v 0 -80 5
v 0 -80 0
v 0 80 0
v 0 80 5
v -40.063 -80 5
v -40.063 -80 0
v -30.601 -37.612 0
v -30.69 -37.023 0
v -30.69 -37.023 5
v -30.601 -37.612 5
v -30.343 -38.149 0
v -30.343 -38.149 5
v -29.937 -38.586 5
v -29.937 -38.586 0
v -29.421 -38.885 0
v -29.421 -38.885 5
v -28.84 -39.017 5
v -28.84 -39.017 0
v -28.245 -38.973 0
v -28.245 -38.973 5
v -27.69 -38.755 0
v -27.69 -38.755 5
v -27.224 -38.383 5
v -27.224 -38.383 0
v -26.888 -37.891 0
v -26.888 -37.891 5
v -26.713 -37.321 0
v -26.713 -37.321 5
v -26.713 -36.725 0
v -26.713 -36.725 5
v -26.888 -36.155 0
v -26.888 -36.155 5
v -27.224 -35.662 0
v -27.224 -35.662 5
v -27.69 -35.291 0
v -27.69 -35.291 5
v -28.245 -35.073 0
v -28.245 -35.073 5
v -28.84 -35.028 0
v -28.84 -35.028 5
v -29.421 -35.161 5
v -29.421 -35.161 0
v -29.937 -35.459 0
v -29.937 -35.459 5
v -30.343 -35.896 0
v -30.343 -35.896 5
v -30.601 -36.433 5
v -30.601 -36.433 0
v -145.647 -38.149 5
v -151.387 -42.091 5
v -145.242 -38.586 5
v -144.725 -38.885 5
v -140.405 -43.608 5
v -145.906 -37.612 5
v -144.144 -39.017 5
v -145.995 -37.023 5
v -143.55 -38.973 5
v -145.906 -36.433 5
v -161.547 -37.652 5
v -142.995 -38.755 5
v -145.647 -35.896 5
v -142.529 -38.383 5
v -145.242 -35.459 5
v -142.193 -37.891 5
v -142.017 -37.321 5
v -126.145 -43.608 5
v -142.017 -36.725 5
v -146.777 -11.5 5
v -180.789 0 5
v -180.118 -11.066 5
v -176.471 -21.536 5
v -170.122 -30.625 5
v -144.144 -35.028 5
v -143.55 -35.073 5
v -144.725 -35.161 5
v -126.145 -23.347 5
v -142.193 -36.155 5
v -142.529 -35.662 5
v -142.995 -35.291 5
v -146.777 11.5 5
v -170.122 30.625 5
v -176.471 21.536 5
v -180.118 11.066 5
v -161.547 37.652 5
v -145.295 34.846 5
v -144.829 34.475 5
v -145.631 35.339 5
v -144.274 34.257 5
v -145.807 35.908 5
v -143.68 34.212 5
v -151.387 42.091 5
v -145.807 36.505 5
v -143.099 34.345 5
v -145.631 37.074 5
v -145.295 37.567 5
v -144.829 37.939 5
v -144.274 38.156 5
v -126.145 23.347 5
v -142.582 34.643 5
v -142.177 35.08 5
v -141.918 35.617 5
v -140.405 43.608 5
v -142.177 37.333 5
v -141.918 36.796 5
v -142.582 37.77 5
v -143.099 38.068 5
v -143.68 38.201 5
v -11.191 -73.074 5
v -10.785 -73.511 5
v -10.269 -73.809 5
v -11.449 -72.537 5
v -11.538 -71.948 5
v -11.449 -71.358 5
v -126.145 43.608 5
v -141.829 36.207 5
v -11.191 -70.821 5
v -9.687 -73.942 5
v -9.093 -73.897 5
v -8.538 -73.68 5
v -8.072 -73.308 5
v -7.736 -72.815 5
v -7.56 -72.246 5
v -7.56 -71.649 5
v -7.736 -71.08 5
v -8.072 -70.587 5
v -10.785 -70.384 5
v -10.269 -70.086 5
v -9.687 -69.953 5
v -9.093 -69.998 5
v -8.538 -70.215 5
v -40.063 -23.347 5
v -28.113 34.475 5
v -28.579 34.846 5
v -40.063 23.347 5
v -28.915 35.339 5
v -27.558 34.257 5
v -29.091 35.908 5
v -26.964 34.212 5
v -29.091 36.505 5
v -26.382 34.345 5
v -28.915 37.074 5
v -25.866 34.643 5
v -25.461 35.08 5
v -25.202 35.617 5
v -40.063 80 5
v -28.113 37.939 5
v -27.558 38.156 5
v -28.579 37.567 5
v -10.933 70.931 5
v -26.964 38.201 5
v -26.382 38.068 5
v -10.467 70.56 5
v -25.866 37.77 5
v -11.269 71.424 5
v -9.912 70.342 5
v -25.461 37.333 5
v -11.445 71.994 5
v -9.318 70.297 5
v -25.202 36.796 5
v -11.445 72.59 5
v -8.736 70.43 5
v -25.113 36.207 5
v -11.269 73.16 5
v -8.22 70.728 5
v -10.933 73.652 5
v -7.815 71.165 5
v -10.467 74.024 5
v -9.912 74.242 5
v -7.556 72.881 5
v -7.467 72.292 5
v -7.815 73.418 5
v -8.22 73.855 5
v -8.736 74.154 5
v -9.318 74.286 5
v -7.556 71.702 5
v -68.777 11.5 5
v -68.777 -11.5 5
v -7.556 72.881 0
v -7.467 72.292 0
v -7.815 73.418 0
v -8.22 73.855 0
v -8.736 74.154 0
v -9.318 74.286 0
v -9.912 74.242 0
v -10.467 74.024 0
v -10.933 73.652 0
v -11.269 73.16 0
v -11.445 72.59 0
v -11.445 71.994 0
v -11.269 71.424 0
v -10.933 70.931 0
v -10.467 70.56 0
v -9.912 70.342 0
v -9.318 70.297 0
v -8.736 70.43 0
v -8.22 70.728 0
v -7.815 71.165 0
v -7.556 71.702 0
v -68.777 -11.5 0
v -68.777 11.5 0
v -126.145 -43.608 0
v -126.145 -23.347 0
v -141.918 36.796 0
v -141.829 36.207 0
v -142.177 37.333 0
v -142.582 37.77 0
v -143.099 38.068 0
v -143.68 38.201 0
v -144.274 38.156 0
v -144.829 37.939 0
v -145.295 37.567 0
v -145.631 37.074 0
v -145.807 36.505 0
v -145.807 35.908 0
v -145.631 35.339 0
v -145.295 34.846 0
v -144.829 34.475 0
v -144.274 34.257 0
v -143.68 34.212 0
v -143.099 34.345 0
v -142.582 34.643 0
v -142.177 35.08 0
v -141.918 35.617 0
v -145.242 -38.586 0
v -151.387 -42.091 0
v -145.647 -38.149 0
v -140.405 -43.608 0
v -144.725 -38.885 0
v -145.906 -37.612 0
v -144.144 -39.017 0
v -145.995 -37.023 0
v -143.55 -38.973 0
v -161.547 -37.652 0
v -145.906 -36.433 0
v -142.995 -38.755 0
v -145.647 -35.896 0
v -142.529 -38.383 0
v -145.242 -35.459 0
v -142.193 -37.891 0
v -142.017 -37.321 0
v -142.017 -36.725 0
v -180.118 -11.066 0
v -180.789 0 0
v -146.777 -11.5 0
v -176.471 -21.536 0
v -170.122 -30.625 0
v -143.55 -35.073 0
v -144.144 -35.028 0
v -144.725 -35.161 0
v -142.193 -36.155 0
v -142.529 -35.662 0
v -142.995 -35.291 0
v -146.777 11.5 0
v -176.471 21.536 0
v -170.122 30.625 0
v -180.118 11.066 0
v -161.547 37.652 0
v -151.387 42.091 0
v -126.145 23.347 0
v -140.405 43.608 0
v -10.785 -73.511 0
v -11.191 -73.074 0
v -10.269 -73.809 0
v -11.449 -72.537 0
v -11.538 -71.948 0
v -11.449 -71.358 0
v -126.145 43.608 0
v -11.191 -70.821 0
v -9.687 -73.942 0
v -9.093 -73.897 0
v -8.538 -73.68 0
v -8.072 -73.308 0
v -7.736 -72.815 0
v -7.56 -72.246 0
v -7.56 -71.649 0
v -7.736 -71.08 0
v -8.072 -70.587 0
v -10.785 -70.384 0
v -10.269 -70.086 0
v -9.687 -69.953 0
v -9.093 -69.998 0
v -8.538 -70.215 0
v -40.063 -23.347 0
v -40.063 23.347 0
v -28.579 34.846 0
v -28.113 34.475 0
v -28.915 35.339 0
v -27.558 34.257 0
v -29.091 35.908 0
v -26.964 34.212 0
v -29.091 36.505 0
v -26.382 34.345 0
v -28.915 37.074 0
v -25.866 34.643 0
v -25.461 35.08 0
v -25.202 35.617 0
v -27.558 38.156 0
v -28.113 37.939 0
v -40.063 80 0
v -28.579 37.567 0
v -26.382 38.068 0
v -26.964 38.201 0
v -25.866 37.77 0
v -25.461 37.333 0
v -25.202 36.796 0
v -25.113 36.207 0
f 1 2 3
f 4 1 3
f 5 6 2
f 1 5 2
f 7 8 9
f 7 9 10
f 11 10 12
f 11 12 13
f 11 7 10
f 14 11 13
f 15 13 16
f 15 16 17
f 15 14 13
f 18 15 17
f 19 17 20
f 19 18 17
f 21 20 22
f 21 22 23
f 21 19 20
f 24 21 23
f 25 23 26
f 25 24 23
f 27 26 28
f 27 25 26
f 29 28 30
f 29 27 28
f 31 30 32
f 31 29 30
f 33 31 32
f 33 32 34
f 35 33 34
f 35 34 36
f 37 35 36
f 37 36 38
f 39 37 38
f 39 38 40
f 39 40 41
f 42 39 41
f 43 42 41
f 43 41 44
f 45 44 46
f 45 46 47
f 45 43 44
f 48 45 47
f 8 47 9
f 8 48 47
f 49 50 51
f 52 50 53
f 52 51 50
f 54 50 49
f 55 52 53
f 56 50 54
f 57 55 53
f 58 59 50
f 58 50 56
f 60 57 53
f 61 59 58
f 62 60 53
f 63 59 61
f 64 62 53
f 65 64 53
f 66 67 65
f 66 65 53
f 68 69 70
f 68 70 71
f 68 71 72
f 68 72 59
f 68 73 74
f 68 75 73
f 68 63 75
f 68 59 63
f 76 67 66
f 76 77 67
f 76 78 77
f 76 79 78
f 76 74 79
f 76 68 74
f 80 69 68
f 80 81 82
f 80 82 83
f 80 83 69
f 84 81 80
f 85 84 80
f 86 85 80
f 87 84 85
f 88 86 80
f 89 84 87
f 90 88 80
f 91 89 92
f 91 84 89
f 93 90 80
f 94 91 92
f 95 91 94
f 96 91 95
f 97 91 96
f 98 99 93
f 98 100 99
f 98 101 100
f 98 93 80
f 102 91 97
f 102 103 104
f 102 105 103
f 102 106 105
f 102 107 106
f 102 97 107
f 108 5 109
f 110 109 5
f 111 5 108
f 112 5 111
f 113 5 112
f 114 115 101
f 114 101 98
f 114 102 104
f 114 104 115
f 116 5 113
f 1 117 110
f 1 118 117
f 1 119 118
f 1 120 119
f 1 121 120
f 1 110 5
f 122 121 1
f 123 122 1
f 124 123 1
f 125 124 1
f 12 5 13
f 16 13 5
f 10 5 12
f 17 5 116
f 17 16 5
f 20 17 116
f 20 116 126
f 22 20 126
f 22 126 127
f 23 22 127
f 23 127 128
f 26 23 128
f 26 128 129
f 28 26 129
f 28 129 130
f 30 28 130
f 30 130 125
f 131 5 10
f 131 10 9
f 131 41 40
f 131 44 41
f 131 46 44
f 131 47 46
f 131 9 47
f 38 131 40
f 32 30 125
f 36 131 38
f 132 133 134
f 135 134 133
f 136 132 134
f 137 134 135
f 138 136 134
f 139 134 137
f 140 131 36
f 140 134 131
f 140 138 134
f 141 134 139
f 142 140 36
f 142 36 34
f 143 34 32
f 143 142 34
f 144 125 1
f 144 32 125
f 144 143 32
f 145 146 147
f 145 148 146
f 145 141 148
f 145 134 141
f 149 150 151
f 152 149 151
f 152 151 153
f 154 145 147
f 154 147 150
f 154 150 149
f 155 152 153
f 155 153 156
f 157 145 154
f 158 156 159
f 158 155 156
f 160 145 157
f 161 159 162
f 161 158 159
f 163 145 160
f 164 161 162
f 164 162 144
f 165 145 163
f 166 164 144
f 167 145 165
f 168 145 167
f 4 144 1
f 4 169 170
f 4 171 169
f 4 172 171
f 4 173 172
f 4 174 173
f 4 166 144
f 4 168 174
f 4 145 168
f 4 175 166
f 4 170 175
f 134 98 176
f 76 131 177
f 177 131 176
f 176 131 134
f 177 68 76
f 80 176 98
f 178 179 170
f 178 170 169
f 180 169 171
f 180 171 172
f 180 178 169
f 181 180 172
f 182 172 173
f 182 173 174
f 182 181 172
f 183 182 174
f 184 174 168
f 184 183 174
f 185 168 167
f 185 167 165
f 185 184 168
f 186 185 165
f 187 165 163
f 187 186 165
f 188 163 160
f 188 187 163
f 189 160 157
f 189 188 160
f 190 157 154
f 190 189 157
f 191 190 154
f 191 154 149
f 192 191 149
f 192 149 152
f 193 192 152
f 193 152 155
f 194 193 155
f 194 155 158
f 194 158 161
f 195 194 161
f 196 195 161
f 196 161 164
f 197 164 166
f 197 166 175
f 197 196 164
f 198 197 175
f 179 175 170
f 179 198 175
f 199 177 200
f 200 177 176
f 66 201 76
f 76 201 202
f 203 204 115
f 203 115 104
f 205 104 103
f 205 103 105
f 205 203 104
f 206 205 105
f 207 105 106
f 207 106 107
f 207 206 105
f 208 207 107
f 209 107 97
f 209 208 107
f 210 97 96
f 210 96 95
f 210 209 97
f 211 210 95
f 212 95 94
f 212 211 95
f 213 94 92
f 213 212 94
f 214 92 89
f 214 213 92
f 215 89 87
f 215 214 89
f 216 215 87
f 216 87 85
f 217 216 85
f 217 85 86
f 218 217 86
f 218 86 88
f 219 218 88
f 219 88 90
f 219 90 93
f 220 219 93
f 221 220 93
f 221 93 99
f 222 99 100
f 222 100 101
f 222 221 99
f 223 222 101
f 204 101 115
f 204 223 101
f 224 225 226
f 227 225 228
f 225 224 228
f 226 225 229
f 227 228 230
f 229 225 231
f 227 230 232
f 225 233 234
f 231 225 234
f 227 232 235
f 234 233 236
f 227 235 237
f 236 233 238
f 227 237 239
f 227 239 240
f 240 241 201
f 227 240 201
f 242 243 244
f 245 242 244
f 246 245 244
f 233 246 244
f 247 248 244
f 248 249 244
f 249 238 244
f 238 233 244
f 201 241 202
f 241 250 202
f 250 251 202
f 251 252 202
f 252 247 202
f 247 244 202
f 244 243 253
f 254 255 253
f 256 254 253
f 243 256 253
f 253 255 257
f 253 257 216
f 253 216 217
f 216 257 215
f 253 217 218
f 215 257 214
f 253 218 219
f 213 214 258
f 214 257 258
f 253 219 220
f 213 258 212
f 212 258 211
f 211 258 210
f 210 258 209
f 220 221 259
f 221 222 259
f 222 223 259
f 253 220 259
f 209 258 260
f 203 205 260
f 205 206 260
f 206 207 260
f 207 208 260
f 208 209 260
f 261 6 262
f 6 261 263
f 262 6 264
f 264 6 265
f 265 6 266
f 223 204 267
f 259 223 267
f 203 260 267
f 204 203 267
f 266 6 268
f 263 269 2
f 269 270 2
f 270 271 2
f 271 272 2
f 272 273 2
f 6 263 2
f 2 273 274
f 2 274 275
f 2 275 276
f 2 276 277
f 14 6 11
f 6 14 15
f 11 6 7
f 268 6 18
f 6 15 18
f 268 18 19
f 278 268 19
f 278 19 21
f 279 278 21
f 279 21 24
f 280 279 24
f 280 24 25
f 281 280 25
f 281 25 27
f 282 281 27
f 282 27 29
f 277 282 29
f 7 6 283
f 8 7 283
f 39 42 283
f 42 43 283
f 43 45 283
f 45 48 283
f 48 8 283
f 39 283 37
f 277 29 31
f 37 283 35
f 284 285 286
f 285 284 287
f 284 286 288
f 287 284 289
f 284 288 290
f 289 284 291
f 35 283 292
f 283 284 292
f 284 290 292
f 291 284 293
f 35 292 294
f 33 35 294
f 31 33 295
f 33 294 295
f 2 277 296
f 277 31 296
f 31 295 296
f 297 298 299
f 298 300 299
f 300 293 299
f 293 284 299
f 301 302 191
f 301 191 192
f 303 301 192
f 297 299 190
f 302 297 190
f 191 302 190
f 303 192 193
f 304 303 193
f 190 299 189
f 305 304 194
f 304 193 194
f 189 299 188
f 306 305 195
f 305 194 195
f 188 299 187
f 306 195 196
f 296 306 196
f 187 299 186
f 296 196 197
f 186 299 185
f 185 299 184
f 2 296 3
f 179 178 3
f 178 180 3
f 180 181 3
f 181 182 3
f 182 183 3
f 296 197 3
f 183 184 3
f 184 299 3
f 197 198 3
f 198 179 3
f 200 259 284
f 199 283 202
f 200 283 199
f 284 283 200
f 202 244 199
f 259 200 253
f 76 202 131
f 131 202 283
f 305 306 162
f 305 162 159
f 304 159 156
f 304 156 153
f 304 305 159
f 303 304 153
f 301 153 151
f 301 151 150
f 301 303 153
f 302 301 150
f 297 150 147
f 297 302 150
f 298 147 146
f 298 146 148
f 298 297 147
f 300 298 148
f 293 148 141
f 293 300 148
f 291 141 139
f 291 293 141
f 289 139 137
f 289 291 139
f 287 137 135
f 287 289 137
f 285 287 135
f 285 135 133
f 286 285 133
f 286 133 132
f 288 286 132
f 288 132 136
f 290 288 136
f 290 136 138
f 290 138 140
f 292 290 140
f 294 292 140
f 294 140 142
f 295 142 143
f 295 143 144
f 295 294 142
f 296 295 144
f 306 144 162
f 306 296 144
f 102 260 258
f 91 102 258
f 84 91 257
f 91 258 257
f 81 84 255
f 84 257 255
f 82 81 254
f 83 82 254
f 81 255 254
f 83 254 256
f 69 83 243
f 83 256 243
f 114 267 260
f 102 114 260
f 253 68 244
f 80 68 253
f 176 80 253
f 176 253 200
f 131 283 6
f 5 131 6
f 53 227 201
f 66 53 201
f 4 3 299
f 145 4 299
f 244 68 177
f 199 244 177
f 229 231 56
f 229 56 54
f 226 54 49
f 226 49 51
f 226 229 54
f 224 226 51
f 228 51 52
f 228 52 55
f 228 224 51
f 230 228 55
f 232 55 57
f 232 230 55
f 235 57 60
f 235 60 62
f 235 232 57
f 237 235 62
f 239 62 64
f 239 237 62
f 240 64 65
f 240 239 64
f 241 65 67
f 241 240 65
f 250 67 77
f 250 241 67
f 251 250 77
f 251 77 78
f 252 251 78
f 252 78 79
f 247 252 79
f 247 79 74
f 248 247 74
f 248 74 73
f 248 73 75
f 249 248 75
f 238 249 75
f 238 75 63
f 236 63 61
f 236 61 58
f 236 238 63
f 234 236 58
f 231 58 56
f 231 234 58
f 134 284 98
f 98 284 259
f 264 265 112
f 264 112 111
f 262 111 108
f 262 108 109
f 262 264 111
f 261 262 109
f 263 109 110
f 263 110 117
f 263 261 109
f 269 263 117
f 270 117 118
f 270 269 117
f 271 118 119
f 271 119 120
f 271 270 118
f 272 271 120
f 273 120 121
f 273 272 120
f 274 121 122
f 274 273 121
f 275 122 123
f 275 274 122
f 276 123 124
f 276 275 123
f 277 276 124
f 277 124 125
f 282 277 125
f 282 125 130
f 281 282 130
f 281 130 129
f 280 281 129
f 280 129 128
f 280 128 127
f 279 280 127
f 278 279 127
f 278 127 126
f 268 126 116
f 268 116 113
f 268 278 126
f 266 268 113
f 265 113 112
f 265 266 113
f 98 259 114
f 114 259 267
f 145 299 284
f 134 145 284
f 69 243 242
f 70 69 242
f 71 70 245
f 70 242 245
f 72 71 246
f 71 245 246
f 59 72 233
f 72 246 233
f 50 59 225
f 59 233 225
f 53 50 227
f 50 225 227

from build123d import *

# Parameters (mm, degrees)
ESQUISSE1_R             = 2
BOSS_EXTRU_2_DEPTH      = 5
ESQUISSE2_W             = 78
ESQUISSE2_H             = 23
ENL_V_MAT_EXTRU_2_DEPTH = 5


with BuildPart() as part:
    # Esquisse1 → Boss.-Extru.2 (new body)
    with BuildSketch(Plane.XY):
        with BuildLine():
            Line((0, 80), (-40.063357395, 80))
            Line((-40.063357395, 80), (-40.063357395, 43.608028339))
            Line((-40.063357395, 43.608028339), (-40.063357395, 23.347203835))
            Line((-40.063357395, 23.347203835), (-126.14466041, 23.347203835))
            Line((-126.14466041, 23.347203835), (-126.14466041, 43.608028339))
            Line((-126.14466041, 43.608028339), (-140.404811956, 43.608028339))
            ThreePointArc((-140.404811956, 43.608028339), (-170.122450923, 30.625328971), (-180.789117416, 0))
            ThreePointArc((-180.789117416, 0), (-170.122450923, -30.625328971), (-140.404811956, -43.608028339))
            Line((-140.404811956, -43.608028339), (-126.14466041, -43.608028339))
            Line((-126.14466041, -43.608028339), (-126.14466041, -23.347203835))
            Line((-126.14466041, -23.347203835), (-40.063357395, -23.347203835))
            Line((-40.063357395, -23.347203835), (-40.063357395, -43.608028339))
            Line((-40.063357395, -43.608028339), (-40.063357395, -80))
            Line((-40.063357395, -80), (0, -80))
            Line((0, -80), (0, 80))
        make_face()
        with Locations((-143.829395777, 36.206579824)):
            Circle(ESQUISSE1_R, mode=Mode.SUBTRACT)
        with Locations((-27.113068306, 36.206579824)):
            Circle(ESQUISSE1_R, mode=Mode.SUBTRACT)
        with Locations((-9.467128793, 72.29182392)):
            Circle(ESQUISSE1_R, mode=Mode.SUBTRACT)
        with Locations(Location((-9.538022857, -71.947546017, 0), (0, 0, 180))):
            Circle(ESQUISSE1_R, mode=Mode.SUBTRACT)
        with Locations(Location((-28.690315975, -37.022776214, 0), (0, 0, 180))):
            Circle(ESQUISSE1_R, mode=Mode.SUBTRACT)
        with Locations(Location((-143.994710805, -37.022776214, 0), (0, 0, 180))):
            Circle(ESQUISSE1_R, mode=Mode.SUBTRACT)
    extrude(amount=BOSS_EXTRU_2_DEPTH)

    # Esquisse2 → Enlèv. mat.-Extru.2 (cut)
    with BuildSketch(Plane.XY.offset(5)):
        with Locations((-107.776795965, 0)):
            Rectangle(ESQUISSE2_W, ESQUISSE2_H)
    extrude(amount=-ENL_V_MAT_EXTRU_2_DEPTH, mode=Mode.SUBTRACT)


solid = part.part
